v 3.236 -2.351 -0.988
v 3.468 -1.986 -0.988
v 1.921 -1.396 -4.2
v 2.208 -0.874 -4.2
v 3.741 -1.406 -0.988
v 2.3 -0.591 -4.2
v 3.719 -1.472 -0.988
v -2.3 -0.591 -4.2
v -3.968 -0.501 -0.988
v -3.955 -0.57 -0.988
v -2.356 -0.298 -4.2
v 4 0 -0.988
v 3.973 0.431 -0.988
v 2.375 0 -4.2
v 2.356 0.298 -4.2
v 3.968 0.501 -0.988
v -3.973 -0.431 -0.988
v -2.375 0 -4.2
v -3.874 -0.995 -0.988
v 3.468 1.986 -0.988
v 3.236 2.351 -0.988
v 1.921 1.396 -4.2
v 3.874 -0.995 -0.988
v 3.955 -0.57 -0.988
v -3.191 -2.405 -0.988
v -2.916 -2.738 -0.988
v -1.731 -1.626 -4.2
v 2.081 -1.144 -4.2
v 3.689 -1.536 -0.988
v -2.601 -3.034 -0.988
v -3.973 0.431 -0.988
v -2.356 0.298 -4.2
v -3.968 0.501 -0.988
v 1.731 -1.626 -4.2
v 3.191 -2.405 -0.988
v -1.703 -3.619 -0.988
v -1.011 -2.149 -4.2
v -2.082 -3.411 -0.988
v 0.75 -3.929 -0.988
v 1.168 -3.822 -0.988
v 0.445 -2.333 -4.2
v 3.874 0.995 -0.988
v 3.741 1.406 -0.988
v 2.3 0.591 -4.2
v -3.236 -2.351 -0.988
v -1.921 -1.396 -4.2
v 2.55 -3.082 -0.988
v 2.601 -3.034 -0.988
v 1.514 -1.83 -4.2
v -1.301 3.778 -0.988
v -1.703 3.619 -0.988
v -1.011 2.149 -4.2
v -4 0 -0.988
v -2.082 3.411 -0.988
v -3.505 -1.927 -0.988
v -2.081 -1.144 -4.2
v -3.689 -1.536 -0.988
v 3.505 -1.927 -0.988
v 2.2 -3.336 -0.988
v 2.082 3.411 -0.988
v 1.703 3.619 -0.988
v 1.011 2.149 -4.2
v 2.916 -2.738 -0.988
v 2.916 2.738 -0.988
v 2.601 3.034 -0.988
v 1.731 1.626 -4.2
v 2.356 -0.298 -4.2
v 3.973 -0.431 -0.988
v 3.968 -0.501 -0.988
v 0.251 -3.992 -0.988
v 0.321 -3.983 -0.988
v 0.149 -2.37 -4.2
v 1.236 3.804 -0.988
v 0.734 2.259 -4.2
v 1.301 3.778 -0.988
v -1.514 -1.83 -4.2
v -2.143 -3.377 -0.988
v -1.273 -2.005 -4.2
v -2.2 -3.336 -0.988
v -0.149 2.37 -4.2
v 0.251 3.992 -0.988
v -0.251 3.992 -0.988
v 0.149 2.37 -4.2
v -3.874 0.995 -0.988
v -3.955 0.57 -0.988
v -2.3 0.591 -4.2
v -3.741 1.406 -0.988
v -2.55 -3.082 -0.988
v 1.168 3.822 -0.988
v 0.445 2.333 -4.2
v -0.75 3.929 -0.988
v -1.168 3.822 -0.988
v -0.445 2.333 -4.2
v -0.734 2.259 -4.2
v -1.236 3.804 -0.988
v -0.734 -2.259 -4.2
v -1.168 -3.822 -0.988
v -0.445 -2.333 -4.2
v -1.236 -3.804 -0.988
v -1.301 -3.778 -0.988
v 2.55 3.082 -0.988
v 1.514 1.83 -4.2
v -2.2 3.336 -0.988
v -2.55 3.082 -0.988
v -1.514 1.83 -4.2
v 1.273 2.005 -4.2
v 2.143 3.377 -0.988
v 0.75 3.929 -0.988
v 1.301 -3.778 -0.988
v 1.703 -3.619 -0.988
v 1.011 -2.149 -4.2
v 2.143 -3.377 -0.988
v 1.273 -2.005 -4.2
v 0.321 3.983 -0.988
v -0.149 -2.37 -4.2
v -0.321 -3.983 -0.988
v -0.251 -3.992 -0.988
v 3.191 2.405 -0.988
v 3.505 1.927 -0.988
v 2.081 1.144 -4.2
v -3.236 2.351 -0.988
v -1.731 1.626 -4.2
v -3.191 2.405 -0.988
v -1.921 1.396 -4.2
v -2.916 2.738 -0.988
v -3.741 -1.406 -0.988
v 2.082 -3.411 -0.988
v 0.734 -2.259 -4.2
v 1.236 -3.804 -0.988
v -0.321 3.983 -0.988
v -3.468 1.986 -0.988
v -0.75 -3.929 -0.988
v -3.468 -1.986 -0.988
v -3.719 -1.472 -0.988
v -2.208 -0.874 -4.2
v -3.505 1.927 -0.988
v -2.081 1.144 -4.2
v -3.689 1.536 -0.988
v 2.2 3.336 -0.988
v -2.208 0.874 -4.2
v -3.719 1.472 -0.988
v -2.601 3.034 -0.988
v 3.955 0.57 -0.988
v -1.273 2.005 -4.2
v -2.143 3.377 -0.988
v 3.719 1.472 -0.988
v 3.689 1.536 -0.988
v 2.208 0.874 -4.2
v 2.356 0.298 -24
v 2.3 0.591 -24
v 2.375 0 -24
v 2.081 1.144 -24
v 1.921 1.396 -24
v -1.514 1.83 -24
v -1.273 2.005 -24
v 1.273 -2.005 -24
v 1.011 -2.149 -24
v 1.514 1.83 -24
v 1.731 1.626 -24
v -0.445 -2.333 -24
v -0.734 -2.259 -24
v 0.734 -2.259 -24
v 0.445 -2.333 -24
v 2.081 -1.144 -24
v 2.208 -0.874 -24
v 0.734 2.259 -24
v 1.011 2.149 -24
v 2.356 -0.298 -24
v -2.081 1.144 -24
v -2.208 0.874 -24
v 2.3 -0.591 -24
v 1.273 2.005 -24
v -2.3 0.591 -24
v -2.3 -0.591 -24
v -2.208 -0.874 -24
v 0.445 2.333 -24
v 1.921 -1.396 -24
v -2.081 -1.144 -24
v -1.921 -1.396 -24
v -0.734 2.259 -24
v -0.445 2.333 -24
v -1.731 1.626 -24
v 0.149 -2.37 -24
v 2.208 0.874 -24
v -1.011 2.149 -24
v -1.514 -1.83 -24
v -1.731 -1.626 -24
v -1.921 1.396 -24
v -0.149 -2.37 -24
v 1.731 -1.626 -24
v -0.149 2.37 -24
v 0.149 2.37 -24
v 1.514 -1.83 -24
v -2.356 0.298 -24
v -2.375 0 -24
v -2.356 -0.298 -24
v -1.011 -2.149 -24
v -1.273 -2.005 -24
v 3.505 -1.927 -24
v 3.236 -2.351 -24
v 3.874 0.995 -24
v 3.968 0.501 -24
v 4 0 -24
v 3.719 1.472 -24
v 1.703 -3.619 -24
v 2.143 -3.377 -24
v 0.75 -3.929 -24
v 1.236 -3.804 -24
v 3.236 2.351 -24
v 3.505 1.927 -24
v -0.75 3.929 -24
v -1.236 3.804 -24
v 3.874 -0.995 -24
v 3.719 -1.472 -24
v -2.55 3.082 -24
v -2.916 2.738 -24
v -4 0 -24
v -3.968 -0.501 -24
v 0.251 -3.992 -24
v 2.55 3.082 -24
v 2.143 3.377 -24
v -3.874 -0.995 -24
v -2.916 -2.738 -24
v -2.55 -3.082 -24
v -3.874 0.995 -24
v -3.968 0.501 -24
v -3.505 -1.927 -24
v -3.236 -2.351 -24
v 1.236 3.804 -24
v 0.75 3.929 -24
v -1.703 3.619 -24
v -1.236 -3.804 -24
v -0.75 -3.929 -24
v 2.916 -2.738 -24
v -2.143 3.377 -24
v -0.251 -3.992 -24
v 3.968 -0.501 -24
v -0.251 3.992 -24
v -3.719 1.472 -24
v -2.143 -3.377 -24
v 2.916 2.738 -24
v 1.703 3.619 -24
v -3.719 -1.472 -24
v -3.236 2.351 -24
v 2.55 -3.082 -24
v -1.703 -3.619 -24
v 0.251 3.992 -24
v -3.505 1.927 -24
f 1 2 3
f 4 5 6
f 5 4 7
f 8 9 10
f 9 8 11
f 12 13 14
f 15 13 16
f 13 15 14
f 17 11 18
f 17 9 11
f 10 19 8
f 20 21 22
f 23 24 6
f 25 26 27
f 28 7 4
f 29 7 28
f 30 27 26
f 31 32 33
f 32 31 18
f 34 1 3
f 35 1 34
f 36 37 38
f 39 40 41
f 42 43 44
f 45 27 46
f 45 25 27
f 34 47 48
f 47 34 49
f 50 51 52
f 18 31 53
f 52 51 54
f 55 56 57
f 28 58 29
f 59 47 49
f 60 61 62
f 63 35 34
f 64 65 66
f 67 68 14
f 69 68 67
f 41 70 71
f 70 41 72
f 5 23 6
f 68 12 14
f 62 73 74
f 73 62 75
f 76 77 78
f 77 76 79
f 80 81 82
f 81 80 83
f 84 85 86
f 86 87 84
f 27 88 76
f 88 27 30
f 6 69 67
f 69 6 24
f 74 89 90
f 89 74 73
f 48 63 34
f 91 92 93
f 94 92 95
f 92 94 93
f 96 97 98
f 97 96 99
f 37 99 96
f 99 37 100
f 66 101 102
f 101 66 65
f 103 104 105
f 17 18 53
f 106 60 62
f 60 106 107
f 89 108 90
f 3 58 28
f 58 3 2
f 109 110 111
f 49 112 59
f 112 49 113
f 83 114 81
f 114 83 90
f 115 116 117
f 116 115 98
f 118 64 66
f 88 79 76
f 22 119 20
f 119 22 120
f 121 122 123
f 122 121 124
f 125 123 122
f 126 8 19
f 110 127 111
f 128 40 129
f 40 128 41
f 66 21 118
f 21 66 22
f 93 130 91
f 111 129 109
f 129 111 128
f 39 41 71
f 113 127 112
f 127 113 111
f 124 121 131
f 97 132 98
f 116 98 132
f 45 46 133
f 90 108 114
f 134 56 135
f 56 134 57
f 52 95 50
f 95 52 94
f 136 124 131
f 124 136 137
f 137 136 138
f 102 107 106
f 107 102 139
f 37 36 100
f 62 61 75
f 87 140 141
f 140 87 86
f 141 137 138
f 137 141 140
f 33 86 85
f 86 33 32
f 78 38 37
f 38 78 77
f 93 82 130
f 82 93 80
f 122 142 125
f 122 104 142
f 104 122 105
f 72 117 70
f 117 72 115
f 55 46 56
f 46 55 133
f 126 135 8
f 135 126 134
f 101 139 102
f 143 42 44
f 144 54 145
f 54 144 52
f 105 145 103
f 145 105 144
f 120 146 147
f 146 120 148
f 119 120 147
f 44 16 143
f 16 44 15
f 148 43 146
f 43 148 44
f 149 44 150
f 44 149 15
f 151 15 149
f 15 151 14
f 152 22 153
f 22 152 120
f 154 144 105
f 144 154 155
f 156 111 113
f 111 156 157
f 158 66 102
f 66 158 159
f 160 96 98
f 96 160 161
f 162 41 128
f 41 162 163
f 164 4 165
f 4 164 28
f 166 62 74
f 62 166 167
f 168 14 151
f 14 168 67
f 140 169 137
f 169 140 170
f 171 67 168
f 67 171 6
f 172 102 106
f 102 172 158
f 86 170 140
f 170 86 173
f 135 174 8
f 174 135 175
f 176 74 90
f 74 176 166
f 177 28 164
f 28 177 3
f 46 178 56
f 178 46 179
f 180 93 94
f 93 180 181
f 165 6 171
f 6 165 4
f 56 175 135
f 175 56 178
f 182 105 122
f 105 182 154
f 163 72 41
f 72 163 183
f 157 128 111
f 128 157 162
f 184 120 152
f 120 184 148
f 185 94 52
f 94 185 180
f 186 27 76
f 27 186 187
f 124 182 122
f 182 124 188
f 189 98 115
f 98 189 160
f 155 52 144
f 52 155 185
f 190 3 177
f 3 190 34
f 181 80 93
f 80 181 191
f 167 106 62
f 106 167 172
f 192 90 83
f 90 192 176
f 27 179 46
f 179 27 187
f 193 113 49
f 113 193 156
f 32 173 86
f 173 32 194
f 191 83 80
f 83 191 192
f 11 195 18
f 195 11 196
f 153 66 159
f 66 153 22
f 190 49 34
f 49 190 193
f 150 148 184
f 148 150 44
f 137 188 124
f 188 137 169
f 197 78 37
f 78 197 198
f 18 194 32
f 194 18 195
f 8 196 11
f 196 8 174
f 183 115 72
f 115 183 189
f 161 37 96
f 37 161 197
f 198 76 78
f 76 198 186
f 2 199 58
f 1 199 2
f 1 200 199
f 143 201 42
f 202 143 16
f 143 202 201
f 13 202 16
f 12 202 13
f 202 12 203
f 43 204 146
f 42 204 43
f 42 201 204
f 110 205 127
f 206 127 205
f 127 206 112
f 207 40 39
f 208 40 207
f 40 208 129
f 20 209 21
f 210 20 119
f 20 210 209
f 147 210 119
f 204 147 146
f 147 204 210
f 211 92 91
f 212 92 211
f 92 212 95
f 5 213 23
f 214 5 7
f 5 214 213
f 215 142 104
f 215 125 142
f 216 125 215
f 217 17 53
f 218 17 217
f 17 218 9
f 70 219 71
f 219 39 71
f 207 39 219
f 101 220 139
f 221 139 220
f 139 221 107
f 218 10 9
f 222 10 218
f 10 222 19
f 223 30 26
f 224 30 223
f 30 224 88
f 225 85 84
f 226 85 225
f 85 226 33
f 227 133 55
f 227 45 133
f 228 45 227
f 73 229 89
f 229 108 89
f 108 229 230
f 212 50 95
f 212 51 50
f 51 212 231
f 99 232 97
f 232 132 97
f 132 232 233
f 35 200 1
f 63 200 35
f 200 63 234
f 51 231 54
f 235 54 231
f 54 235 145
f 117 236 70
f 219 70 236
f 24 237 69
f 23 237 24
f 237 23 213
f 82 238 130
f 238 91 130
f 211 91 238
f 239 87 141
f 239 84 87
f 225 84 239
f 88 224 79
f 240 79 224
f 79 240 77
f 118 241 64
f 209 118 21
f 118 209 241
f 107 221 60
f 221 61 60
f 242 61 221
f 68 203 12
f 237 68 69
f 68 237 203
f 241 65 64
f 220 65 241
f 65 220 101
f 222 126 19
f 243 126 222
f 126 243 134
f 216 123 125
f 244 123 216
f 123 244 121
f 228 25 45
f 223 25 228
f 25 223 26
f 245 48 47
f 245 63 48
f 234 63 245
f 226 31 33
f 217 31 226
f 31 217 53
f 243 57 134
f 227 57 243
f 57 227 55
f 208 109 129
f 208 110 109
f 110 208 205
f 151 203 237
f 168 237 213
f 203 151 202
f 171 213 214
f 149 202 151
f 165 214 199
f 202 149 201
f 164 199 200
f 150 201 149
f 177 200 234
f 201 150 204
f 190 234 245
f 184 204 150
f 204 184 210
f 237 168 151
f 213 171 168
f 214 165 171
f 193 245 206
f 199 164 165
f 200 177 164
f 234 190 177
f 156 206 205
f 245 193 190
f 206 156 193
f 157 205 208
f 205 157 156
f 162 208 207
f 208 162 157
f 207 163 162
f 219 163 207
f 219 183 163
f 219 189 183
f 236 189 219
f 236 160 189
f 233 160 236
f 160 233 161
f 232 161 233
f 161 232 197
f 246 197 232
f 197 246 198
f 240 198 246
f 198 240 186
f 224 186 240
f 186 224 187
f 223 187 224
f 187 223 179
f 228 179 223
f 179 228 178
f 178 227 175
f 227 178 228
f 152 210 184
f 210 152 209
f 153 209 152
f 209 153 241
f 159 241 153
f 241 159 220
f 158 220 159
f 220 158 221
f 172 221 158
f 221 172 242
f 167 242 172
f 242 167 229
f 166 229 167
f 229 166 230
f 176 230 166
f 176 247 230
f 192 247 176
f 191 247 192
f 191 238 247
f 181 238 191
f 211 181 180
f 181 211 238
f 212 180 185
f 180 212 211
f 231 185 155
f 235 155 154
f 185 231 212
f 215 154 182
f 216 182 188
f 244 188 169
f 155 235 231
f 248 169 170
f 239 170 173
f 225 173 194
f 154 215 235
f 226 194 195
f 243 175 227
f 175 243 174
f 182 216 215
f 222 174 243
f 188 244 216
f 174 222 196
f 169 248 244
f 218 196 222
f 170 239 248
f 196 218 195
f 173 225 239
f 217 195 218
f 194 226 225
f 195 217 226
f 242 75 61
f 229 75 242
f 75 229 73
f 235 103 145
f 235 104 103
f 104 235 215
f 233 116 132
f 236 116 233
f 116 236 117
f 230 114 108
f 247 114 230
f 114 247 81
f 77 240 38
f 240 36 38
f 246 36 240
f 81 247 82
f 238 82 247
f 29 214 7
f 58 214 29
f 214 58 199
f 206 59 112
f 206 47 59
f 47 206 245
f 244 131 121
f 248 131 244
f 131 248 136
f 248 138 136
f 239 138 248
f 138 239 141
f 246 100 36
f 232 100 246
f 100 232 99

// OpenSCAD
$fn = 50;

difference() {
	union() {
		translate(v = [0, 0, -24.0]) {
			cylinder(h = 24, r = 4.0);
		}
	}
	union() {
		translate(v = [0, 0, 0]) {
			rotate(a = [0, 0, 0]) {
				difference() {
					union() {
						translate(v = [0, 0, -27.0]) {
							cylinder(h = 27, r = 2.25);
						}
						translate(v = [0, 0, -4.2]) {
							cylinder(h = 4.2, r1 = 2.375, r2 = 4.5);
						}
						translate(v = [0, 0, -27.0]) {
							cylinder(h = 27, r = 2.375);
						}
						translate(v = [0, 0, -27.0]) {
							cylinder(h = 27, r = 2.25);
						}
					}
					union();
				}
			}
		}
	}
}
